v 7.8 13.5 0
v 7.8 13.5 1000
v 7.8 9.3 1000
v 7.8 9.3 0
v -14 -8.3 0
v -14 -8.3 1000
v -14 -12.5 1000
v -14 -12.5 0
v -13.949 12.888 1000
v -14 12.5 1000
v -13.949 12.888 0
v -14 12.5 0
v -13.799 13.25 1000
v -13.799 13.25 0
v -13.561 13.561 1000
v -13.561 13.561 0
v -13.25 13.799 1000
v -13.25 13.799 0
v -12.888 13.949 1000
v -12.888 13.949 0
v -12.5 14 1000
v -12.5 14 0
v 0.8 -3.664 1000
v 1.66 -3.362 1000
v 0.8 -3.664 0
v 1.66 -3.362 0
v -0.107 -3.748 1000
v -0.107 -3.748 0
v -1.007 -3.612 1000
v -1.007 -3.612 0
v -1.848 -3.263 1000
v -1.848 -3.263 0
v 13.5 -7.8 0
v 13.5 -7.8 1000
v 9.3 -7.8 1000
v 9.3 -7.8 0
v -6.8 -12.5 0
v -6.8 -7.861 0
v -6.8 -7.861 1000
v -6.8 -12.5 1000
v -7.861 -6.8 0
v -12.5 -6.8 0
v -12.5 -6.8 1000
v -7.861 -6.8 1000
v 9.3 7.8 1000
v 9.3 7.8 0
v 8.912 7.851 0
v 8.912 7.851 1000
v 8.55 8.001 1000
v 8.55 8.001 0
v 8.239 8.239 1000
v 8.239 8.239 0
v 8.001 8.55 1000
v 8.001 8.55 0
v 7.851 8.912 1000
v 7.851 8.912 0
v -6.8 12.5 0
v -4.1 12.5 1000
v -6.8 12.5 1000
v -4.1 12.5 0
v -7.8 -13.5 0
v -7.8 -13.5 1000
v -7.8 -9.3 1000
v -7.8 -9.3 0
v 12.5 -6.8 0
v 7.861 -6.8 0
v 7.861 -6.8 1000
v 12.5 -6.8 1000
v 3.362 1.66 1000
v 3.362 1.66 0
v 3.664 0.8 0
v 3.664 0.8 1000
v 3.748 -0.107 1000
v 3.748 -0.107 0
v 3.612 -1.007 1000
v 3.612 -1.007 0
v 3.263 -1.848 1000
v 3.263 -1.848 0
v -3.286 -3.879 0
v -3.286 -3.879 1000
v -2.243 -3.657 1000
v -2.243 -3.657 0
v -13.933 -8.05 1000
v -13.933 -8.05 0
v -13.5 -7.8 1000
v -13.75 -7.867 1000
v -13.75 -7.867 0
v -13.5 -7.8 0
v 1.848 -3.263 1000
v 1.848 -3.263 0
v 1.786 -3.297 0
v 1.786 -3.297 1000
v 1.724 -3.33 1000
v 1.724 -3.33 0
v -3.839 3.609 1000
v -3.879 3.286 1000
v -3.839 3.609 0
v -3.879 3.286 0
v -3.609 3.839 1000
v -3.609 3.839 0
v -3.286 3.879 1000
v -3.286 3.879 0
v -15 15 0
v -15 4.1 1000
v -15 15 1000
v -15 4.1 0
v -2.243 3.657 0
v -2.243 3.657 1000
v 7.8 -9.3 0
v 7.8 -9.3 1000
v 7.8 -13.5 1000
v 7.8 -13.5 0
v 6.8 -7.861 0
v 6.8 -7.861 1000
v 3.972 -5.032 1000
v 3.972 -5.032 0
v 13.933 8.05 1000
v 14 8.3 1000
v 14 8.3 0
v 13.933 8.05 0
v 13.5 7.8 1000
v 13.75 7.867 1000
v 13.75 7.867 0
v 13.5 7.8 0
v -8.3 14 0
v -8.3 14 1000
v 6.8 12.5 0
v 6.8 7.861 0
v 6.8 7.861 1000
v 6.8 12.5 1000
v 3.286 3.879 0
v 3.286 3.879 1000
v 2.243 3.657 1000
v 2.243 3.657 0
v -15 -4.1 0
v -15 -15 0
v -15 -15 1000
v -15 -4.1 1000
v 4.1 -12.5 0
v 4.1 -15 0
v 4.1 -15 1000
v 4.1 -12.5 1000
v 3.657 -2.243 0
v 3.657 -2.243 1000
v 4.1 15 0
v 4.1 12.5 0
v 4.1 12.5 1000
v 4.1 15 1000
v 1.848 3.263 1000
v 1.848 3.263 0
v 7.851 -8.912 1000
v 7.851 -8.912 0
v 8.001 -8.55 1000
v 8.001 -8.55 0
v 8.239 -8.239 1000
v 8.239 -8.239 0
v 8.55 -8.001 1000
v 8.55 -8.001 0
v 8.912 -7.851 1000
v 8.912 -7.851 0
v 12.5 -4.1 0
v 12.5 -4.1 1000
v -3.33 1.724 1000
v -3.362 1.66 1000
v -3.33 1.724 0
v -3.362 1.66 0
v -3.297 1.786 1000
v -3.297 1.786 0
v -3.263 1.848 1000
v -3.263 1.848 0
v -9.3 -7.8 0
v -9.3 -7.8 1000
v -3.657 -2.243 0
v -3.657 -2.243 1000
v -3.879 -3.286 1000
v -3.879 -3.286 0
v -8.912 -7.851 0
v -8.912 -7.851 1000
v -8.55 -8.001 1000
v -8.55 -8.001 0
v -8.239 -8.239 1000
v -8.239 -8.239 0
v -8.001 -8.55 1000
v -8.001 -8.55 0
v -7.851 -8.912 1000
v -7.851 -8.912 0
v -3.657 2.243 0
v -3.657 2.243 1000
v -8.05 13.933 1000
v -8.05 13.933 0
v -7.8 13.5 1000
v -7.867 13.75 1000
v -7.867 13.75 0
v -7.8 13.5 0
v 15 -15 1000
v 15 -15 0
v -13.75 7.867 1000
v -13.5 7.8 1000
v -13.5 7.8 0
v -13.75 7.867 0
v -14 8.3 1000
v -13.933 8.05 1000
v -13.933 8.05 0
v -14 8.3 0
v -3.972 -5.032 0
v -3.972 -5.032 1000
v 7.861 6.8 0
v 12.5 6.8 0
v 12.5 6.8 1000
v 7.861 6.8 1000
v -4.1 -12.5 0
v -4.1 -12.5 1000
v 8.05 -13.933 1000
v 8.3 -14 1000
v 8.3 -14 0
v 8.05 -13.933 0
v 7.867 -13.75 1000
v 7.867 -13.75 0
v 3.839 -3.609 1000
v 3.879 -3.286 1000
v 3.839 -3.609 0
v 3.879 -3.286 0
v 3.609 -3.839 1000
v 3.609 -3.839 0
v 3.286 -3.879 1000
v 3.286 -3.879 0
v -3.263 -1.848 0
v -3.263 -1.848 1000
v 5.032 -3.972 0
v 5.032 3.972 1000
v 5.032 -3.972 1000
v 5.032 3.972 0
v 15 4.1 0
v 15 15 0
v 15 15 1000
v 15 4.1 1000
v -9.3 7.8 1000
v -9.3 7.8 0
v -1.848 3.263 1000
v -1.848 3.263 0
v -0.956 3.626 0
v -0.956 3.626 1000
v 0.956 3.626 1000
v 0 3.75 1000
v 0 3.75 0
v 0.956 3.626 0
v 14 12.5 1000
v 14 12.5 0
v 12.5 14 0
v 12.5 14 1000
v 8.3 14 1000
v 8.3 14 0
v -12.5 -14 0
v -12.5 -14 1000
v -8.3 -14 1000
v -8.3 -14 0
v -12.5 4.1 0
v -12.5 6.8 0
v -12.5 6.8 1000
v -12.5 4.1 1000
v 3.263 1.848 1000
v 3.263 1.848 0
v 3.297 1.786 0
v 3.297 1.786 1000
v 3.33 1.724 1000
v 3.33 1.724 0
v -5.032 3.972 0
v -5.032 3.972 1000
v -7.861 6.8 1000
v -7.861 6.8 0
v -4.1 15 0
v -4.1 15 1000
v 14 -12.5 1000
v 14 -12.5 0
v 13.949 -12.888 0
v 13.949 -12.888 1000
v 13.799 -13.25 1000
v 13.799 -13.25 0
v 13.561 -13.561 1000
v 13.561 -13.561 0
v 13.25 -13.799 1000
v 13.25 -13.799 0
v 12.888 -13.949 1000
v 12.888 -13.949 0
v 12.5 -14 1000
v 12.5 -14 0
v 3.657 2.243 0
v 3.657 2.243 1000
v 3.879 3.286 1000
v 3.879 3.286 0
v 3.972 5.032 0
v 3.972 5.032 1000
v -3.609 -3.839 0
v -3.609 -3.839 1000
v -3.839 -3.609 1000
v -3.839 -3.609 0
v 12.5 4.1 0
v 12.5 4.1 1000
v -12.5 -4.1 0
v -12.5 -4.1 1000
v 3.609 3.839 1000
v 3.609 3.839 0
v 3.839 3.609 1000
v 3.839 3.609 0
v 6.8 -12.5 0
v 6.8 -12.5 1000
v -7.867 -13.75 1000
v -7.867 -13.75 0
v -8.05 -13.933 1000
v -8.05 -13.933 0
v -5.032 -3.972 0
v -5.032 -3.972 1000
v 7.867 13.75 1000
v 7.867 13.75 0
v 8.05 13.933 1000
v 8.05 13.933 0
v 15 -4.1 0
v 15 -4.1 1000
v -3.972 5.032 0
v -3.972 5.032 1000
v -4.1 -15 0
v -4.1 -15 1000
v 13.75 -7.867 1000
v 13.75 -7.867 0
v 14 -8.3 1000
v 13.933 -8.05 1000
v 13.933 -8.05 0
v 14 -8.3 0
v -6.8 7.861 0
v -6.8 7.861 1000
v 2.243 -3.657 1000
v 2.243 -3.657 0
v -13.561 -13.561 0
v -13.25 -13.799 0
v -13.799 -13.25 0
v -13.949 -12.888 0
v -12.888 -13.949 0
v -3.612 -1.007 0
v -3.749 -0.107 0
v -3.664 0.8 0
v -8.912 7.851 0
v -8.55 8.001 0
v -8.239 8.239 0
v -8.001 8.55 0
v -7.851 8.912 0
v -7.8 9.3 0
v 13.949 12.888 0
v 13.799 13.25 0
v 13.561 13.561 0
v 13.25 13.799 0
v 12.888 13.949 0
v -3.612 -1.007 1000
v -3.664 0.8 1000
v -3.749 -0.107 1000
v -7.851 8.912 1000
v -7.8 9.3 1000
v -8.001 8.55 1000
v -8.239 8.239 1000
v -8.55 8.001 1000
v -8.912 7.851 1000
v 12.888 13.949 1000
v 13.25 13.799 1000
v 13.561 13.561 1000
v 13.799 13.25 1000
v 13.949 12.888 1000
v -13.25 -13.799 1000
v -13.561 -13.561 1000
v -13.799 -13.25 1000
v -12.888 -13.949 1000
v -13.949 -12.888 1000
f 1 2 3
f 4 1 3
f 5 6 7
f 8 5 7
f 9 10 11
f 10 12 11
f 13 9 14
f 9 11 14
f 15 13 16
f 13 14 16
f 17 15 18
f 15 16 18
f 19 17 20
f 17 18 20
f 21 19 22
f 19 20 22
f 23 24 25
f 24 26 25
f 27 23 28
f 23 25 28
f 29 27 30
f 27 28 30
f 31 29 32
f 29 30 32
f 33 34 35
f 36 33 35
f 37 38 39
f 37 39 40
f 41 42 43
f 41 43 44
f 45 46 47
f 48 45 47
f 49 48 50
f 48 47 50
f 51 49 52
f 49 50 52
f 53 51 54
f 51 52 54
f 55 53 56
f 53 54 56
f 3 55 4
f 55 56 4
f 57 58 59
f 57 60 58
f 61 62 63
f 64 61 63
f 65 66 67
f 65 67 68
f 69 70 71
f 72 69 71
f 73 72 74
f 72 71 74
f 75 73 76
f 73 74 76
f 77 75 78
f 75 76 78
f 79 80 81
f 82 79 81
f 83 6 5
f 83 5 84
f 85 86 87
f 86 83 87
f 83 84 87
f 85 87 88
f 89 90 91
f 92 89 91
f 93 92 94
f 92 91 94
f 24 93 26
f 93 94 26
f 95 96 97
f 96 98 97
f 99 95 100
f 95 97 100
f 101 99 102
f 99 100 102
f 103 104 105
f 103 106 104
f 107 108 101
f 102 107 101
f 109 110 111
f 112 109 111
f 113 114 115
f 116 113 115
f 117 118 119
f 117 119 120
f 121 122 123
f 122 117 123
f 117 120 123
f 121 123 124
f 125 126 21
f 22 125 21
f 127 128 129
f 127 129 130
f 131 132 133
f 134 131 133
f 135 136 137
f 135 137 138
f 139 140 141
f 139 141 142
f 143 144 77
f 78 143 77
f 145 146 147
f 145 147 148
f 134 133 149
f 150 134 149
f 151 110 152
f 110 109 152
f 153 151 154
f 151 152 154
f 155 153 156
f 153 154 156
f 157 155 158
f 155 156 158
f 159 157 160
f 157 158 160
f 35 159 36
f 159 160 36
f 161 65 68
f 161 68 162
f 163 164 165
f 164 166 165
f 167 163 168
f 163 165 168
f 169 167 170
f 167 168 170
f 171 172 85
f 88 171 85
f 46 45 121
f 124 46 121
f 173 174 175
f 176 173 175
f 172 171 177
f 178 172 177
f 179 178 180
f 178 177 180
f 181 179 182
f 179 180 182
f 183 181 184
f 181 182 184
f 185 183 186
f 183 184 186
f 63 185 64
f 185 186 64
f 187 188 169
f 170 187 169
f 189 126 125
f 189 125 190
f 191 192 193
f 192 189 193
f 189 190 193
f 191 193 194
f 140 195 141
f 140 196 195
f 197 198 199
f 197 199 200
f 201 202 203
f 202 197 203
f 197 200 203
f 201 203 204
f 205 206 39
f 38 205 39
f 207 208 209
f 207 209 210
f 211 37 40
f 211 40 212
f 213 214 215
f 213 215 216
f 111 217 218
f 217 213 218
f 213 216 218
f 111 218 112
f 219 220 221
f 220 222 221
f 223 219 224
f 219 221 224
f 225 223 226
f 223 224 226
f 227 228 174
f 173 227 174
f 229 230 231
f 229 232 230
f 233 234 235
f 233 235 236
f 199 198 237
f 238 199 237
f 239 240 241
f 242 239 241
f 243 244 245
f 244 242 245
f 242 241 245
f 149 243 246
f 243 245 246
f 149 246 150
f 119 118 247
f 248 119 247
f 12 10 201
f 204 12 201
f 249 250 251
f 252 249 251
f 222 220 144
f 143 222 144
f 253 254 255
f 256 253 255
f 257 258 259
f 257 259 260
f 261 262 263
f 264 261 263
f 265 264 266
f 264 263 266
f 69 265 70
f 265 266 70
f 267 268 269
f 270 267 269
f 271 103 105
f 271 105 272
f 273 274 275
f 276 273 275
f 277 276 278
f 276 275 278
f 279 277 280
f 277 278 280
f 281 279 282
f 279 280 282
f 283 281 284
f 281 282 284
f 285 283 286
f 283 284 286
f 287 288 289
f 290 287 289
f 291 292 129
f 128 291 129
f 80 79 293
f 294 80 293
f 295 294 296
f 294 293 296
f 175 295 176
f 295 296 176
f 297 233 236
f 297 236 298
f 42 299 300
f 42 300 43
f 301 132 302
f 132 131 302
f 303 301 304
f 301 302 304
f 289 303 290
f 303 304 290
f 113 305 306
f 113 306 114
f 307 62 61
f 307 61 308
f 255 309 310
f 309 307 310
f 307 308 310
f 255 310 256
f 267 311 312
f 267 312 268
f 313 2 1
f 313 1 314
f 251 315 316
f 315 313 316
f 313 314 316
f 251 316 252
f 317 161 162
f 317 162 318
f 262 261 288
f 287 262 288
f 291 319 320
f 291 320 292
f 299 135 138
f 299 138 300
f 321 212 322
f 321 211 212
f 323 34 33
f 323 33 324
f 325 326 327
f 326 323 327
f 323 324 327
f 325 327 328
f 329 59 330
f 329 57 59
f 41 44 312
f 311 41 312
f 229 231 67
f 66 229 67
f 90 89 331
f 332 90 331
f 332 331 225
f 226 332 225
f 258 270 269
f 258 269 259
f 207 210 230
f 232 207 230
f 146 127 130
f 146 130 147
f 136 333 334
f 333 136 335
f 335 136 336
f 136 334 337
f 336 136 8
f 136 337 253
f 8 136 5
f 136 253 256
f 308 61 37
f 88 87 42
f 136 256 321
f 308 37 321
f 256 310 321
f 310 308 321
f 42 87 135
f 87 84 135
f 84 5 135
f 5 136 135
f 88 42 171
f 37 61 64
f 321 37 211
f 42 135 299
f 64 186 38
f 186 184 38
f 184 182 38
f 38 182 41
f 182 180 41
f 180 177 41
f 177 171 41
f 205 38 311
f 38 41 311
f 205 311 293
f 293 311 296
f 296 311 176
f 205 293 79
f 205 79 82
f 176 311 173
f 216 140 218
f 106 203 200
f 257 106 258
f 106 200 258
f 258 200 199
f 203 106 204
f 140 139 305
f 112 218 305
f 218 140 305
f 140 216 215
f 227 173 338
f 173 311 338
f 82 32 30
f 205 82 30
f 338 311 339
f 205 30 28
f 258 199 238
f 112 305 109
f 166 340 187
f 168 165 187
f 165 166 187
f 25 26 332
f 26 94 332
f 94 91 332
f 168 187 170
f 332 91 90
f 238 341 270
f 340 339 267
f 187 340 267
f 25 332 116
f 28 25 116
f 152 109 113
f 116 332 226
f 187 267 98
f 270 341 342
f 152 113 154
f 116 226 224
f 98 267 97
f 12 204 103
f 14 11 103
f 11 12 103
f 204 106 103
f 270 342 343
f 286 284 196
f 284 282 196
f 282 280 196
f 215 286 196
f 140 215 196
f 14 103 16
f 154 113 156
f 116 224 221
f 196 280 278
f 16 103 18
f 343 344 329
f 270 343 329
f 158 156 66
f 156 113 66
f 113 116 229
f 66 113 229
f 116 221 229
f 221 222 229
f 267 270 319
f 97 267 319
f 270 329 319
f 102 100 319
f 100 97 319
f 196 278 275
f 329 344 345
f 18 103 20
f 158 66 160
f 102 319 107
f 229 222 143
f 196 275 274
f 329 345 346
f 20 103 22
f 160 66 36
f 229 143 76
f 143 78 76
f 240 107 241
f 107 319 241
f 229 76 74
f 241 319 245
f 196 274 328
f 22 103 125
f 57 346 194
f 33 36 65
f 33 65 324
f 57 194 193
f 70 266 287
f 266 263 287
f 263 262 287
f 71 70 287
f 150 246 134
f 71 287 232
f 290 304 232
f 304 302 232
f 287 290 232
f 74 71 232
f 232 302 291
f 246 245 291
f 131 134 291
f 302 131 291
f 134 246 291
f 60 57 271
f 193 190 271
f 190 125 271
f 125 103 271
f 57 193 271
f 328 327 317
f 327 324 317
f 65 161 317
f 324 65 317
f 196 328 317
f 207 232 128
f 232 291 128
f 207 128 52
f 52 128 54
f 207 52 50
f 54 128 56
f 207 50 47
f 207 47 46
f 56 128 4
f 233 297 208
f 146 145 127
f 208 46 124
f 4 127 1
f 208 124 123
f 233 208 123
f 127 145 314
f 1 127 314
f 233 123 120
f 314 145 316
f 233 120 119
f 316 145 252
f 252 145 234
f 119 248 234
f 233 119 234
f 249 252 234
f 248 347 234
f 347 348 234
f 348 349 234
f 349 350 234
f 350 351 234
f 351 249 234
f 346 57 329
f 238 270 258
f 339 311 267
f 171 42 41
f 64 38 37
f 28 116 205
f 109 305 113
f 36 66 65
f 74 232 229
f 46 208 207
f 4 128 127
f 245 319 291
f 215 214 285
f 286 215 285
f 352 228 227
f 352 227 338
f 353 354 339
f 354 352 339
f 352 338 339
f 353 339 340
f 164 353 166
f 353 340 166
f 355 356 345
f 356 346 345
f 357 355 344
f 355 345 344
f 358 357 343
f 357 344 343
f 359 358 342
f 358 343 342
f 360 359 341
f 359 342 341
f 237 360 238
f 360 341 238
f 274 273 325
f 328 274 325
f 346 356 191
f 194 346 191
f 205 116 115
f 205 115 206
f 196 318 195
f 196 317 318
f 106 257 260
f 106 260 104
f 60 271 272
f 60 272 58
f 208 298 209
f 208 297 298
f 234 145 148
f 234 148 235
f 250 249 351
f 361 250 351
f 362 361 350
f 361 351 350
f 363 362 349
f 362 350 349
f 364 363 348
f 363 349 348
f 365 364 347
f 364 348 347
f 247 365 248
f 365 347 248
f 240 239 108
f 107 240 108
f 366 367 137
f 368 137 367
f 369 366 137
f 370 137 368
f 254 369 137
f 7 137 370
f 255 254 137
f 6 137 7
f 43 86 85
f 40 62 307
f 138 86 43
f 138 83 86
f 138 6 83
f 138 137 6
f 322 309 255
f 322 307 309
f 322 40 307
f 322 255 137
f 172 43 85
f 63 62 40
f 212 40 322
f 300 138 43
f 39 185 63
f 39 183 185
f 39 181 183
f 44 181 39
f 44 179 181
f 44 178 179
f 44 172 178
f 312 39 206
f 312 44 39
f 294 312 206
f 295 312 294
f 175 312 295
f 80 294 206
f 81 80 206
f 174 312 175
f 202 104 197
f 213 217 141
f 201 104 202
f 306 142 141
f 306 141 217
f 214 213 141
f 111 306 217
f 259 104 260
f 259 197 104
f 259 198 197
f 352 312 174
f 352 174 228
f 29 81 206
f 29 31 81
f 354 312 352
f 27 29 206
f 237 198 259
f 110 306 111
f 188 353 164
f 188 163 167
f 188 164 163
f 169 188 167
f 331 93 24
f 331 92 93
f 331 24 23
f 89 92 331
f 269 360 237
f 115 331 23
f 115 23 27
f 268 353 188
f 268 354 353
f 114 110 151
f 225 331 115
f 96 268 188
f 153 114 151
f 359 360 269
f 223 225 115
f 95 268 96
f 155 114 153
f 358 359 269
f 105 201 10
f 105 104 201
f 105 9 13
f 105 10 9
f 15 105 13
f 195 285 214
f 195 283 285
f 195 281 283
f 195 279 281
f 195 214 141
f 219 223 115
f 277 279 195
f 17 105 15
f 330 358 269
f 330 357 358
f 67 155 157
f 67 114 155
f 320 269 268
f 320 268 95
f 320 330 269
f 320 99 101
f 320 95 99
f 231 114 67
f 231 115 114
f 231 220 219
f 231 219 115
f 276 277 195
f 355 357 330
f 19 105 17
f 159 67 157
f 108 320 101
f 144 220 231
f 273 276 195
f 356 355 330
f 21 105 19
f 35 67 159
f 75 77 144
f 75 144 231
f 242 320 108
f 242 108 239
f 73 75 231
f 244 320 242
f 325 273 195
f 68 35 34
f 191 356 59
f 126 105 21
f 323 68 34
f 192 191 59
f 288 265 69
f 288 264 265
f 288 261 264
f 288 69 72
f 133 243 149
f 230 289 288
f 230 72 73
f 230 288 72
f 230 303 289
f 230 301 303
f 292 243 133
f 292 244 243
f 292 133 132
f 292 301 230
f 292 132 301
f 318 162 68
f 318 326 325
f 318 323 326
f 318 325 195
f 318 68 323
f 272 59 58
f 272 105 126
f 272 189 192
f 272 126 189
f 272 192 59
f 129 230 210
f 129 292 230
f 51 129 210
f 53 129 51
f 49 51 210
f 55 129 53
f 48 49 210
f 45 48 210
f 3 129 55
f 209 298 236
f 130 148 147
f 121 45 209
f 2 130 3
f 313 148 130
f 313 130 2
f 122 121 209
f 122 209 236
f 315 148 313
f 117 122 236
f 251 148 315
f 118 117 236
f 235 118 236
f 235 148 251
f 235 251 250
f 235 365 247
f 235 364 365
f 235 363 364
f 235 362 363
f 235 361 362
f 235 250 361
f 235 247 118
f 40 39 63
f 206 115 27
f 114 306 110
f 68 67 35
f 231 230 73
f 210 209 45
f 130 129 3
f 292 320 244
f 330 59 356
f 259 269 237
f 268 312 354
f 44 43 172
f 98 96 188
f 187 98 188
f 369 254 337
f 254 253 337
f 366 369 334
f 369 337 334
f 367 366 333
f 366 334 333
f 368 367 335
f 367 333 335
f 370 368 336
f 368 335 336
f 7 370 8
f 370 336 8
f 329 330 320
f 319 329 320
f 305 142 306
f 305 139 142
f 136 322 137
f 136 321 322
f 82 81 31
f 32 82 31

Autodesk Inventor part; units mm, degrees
ref_plane "YZ Plane" through (0, 0, 0) normal (1, 0, 0) x (0, 1, 0)
ref_plane "XZ Plane" through (0, 0, 0) normal (0, 1, 0) x (-1, 0, 0)
ref_plane "XY Plane" through (0, 0, 0) normal (0, 0, 1) x (1, 0, 0)
sketch "Sketch1" plane through (0, 0, 0) normal (0, 0, 1) x (1, 0, 0)
  arc A0 (9.3, -7.8) -> (7.8, -9.3) centre (9.3, -9.3) ccw
  line L0 (13.5, -7.8) -> (9.3, -7.8)
  arc A1 (14, -8.3) -> (13.5, -7.8) centre (13.5, -8.3) ccw
  line L1 (14, -12.5) -> (14, -8.3)
  arc A2 (12.5, -14) -> (14, -12.5) centre (12.5, -12.5) ccw
  line L2 (8.3, -14) -> (12.5, -14)
  arc A3 (7.8, -13.5) -> (8.3, -14) centre (8.3, -13.5) ccw
  line L3 (7.8, -9.3) -> (7.8, -13.5)
  arc A4 (-13.5, -7.8) -> (-14, -8.3) centre (-13.5, -8.3) ccw
  line L4 (-9.3, -7.8) -> (-13.5, -7.8)
  arc A5 (-7.8, -9.3) -> (-9.3, -7.8) centre (-9.3, -9.3) ccw
  line L5 (-7.8, -13.5) -> (-7.8, -9.3)
  arc A6 (-8.3, -14) -> (-7.8, -13.5) centre (-8.3, -13.5) ccw
  line L6 (-12.5, -14) -> (-8.3, -14)
  arc A7 (-14, -12.5) -> (-12.5, -14) centre (-12.5, -12.5) ccw
  line L7 (-14, -8.3) -> (-14, -12.5)
  line L8 (3.2859, 3.8789) -> (2.2431, 3.6573)
  arc A8 (3.8789, 3.2859) -> (3.2859, 3.8789) centre (3.3898, 3.3898) ccw
  line L9 (3.6573, 2.2431) -> (3.8789, 3.2859)
  line L10 (3.2627, 1.8485) -> (3.6573, 2.2431)
  line L11 (3.6573, -2.2431) -> (3.2627, -1.8485)
  line L12 (3.8789, -3.2859) -> (3.6573, -2.2431)
  arc A9 (3.2859, -3.8789) -> (3.8789, -3.2859) centre (3.3898, -3.3898) ccw
  line L13 (2.2431, -3.6573) -> (3.2859, -3.8789)
  line L14 (1.8485, -3.2627) -> (2.2431, -3.6573)
  arc A10 (-1.8485, -3.2627) -> (1.6602, -3.3625) centre (0, 0) ccw
  line L15 (-2.2431, -3.6573) -> (-1.8485, -3.2627)
  line L16 (-3.2859, -3.8789) -> (-2.2431, -3.6573)
  arc A11 (-3.8789, -3.2859) -> (-3.2859, -3.8789) centre (-3.3898, -3.3898) ccw
  line L17 (-3.6573, -2.2431) -> (-3.8789, -3.2859)
  line L18 (-3.2627, -1.8485) -> (-3.6573, -2.2431)
  arc A12 (-3.3625, 1.6602) -> (-3.2627, -1.8485) centre (0, 0) ccw
  line L19 (-3.6573, 2.2431) -> (-3.2627, 1.8485)
  line L20 (-3.8789, 3.2859) -> (-3.6573, 2.2431)
  arc A13 (-3.2859, 3.8789) -> (-3.8789, 3.2859) centre (-3.3898, 3.3898) ccw
  line L21 (-2.2431, 3.6573) -> (-3.2859, 3.8789)
  line L22 (-1.8485, 3.2627) -> (-2.2431, 3.6573)
  line L23 (2.2431, 3.6573) -> (1.8485, 3.2627)
  arc A14 (13.5, 7.8) -> (14, 8.3) centre (13.5, 8.3) ccw
  line L24 (9.3, 7.8) -> (13.5, 7.8)
  arc A15 (7.8, 9.3) -> (9.3, 7.8) centre (9.3, 9.3) ccw
  line L25 (7.8, 13.5) -> (7.8, 9.3)
  arc A16 (8.3, 14) -> (7.8, 13.5) centre (8.3, 13.5) ccw
  line L26 (12.5, 14) -> (8.3, 14)
  arc A17 (14, 12.5) -> (12.5, 14) centre (12.5, 12.5) ccw
  line L27 (14, 8.3) -> (14, 12.5)
  arc A18 (-12.5, 14) -> (-14, 12.5) centre (-12.5, 12.5) ccw
  line L28 (-8.3, 14) -> (-12.5, 14)
  arc A19 (-7.8, 13.5) -> (-8.3, 14) centre (-8.3, 13.5) ccw
  line L29 (-7.8, 9.3) -> (-7.8, 13.5)
  arc A20 (-9.3, 7.8) -> (-7.8, 9.3) centre (-9.3, 9.3) ccw
  line L30 (-13.5, 7.8) -> (-9.3, 7.8)
  arc A21 (-14, 8.3) -> (-13.5, 7.8) centre (-13.5, 8.3) ccw
  line L31 (-14, 12.5) -> (-14, 8.3)
  line L32 (12.5, 4.1) -> (12.5, 6.8)
  line L33 (15, 4.1) -> (12.5, 4.1)
  line L34 (15, 15) -> (15, 4.1)
  line L35 (4.1, 15) -> (15, 15)
  line L36 (4.1, 12.5) -> (4.1, 15)
  line L37 (6.8, 12.5) -> (4.1, 12.5)
  line L38 (6.8, 7.8606) -> (6.8, 12.5)
  line L39 (3.9715, 5.0321) -> (6.8, 7.8606)
  line L40 (-3.9715, 5.0321) -> (3.9715, 5.0321)
  line L41 (-6.8, 7.8606) -> (-3.9715, 5.0321)
  line L42 (-6.8, 12.5) -> (-6.8, 7.8606)
  line L43 (-4.1, 12.5) -> (-6.8, 12.5)
  line L44 (-4.1, 15) -> (-4.1, 12.5)
  line L45 (-15, 15) -> (-4.1, 15)
  line L46 (-15, 4.1) -> (-15, 15)
  line L47 (-12.5, 4.1) -> (-15, 4.1)
  line L48 (-12.5, 6.8) -> (-12.5, 4.1)
  line L49 (-7.8606, 6.8) -> (-12.5, 6.8)
  line L50 (-5.0321, 3.9715) -> (-7.8606, 6.8)
  line L51 (-5.0321, -3.9715) -> (-5.0321, 3.9715)
  line L52 (-7.8606, -6.8) -> (-5.0321, -3.9715)
  line L53 (-12.5, -6.8) -> (-7.8606, -6.8)
  line L54 (-12.5, -4.1) -> (-12.5, -6.8)
  line L55 (-15, -4.1) -> (-12.5, -4.1)
  line L56 (-15, -15) -> (-15, -4.1)
  line L57 (-4.1, -15) -> (-15, -15)
  line L58 (-4.1, -12.5) -> (-4.1, -15)
  line L59 (-6.8, -12.5) -> (-4.1, -12.5)
  line L60 (-6.8, -7.8606) -> (-6.8, -12.5)
  line L61 (-3.9715, -5.0321) -> (-6.8, -7.8606)
  line L62 (3.9715, -5.0321) -> (-3.9715, -5.0321)
  line L63 (6.8, -7.8606) -> (3.9715, -5.0321)
  line L64 (6.8, -12.5) -> (6.8, -7.8606)
  line L65 (4.1, -12.5) -> (6.8, -12.5)
  line L66 (4.1, -15) -> (4.1, -12.5)
  line L67 (15, -15) -> (4.1, -15)
  line L68 (15, -4.1) -> (15, -15)
  line L69 (12.5, -4.1) -> (15, -4.1)
  line L70 (12.5, -6.8) -> (12.5, -4.1)
  line L71 (7.8606, -6.8) -> (12.5, -6.8)
  line L72 (5.0321, -3.9715) -> (7.8606, -6.8)
  line L73 (5.0321, 3.9715) -> (5.0321, -3.9715)
  line L74 (7.8606, 6.8) -> (5.0321, 3.9715)
  line L75 (12.5, 6.8) -> (7.8606, 6.8)
  arc A22 (-3.2627, 1.8485) -> (-3.3625, 1.6602) centre (0, 0) ccw
  arc A23 (3.3625, 1.6602) -> (3.2627, 1.8485) centre (0, 0) ccw
  arc A24 (1.8485, 3.2627) -> (-1.8485, 3.2627) centre (0, 0) ccw
  arc A25 (1.6602, -3.3625) -> (1.8485, -3.2627) centre (0, 0) ccw
  arc A26 (3.2627, -1.8485) -> (3.3625, 1.6602) centre (0, 0) ccw
extrude "Extrusion1" add sketch "Sketch1" along normal blind 1000
properties part number "30x30-01" material "Aluminum-6061"
